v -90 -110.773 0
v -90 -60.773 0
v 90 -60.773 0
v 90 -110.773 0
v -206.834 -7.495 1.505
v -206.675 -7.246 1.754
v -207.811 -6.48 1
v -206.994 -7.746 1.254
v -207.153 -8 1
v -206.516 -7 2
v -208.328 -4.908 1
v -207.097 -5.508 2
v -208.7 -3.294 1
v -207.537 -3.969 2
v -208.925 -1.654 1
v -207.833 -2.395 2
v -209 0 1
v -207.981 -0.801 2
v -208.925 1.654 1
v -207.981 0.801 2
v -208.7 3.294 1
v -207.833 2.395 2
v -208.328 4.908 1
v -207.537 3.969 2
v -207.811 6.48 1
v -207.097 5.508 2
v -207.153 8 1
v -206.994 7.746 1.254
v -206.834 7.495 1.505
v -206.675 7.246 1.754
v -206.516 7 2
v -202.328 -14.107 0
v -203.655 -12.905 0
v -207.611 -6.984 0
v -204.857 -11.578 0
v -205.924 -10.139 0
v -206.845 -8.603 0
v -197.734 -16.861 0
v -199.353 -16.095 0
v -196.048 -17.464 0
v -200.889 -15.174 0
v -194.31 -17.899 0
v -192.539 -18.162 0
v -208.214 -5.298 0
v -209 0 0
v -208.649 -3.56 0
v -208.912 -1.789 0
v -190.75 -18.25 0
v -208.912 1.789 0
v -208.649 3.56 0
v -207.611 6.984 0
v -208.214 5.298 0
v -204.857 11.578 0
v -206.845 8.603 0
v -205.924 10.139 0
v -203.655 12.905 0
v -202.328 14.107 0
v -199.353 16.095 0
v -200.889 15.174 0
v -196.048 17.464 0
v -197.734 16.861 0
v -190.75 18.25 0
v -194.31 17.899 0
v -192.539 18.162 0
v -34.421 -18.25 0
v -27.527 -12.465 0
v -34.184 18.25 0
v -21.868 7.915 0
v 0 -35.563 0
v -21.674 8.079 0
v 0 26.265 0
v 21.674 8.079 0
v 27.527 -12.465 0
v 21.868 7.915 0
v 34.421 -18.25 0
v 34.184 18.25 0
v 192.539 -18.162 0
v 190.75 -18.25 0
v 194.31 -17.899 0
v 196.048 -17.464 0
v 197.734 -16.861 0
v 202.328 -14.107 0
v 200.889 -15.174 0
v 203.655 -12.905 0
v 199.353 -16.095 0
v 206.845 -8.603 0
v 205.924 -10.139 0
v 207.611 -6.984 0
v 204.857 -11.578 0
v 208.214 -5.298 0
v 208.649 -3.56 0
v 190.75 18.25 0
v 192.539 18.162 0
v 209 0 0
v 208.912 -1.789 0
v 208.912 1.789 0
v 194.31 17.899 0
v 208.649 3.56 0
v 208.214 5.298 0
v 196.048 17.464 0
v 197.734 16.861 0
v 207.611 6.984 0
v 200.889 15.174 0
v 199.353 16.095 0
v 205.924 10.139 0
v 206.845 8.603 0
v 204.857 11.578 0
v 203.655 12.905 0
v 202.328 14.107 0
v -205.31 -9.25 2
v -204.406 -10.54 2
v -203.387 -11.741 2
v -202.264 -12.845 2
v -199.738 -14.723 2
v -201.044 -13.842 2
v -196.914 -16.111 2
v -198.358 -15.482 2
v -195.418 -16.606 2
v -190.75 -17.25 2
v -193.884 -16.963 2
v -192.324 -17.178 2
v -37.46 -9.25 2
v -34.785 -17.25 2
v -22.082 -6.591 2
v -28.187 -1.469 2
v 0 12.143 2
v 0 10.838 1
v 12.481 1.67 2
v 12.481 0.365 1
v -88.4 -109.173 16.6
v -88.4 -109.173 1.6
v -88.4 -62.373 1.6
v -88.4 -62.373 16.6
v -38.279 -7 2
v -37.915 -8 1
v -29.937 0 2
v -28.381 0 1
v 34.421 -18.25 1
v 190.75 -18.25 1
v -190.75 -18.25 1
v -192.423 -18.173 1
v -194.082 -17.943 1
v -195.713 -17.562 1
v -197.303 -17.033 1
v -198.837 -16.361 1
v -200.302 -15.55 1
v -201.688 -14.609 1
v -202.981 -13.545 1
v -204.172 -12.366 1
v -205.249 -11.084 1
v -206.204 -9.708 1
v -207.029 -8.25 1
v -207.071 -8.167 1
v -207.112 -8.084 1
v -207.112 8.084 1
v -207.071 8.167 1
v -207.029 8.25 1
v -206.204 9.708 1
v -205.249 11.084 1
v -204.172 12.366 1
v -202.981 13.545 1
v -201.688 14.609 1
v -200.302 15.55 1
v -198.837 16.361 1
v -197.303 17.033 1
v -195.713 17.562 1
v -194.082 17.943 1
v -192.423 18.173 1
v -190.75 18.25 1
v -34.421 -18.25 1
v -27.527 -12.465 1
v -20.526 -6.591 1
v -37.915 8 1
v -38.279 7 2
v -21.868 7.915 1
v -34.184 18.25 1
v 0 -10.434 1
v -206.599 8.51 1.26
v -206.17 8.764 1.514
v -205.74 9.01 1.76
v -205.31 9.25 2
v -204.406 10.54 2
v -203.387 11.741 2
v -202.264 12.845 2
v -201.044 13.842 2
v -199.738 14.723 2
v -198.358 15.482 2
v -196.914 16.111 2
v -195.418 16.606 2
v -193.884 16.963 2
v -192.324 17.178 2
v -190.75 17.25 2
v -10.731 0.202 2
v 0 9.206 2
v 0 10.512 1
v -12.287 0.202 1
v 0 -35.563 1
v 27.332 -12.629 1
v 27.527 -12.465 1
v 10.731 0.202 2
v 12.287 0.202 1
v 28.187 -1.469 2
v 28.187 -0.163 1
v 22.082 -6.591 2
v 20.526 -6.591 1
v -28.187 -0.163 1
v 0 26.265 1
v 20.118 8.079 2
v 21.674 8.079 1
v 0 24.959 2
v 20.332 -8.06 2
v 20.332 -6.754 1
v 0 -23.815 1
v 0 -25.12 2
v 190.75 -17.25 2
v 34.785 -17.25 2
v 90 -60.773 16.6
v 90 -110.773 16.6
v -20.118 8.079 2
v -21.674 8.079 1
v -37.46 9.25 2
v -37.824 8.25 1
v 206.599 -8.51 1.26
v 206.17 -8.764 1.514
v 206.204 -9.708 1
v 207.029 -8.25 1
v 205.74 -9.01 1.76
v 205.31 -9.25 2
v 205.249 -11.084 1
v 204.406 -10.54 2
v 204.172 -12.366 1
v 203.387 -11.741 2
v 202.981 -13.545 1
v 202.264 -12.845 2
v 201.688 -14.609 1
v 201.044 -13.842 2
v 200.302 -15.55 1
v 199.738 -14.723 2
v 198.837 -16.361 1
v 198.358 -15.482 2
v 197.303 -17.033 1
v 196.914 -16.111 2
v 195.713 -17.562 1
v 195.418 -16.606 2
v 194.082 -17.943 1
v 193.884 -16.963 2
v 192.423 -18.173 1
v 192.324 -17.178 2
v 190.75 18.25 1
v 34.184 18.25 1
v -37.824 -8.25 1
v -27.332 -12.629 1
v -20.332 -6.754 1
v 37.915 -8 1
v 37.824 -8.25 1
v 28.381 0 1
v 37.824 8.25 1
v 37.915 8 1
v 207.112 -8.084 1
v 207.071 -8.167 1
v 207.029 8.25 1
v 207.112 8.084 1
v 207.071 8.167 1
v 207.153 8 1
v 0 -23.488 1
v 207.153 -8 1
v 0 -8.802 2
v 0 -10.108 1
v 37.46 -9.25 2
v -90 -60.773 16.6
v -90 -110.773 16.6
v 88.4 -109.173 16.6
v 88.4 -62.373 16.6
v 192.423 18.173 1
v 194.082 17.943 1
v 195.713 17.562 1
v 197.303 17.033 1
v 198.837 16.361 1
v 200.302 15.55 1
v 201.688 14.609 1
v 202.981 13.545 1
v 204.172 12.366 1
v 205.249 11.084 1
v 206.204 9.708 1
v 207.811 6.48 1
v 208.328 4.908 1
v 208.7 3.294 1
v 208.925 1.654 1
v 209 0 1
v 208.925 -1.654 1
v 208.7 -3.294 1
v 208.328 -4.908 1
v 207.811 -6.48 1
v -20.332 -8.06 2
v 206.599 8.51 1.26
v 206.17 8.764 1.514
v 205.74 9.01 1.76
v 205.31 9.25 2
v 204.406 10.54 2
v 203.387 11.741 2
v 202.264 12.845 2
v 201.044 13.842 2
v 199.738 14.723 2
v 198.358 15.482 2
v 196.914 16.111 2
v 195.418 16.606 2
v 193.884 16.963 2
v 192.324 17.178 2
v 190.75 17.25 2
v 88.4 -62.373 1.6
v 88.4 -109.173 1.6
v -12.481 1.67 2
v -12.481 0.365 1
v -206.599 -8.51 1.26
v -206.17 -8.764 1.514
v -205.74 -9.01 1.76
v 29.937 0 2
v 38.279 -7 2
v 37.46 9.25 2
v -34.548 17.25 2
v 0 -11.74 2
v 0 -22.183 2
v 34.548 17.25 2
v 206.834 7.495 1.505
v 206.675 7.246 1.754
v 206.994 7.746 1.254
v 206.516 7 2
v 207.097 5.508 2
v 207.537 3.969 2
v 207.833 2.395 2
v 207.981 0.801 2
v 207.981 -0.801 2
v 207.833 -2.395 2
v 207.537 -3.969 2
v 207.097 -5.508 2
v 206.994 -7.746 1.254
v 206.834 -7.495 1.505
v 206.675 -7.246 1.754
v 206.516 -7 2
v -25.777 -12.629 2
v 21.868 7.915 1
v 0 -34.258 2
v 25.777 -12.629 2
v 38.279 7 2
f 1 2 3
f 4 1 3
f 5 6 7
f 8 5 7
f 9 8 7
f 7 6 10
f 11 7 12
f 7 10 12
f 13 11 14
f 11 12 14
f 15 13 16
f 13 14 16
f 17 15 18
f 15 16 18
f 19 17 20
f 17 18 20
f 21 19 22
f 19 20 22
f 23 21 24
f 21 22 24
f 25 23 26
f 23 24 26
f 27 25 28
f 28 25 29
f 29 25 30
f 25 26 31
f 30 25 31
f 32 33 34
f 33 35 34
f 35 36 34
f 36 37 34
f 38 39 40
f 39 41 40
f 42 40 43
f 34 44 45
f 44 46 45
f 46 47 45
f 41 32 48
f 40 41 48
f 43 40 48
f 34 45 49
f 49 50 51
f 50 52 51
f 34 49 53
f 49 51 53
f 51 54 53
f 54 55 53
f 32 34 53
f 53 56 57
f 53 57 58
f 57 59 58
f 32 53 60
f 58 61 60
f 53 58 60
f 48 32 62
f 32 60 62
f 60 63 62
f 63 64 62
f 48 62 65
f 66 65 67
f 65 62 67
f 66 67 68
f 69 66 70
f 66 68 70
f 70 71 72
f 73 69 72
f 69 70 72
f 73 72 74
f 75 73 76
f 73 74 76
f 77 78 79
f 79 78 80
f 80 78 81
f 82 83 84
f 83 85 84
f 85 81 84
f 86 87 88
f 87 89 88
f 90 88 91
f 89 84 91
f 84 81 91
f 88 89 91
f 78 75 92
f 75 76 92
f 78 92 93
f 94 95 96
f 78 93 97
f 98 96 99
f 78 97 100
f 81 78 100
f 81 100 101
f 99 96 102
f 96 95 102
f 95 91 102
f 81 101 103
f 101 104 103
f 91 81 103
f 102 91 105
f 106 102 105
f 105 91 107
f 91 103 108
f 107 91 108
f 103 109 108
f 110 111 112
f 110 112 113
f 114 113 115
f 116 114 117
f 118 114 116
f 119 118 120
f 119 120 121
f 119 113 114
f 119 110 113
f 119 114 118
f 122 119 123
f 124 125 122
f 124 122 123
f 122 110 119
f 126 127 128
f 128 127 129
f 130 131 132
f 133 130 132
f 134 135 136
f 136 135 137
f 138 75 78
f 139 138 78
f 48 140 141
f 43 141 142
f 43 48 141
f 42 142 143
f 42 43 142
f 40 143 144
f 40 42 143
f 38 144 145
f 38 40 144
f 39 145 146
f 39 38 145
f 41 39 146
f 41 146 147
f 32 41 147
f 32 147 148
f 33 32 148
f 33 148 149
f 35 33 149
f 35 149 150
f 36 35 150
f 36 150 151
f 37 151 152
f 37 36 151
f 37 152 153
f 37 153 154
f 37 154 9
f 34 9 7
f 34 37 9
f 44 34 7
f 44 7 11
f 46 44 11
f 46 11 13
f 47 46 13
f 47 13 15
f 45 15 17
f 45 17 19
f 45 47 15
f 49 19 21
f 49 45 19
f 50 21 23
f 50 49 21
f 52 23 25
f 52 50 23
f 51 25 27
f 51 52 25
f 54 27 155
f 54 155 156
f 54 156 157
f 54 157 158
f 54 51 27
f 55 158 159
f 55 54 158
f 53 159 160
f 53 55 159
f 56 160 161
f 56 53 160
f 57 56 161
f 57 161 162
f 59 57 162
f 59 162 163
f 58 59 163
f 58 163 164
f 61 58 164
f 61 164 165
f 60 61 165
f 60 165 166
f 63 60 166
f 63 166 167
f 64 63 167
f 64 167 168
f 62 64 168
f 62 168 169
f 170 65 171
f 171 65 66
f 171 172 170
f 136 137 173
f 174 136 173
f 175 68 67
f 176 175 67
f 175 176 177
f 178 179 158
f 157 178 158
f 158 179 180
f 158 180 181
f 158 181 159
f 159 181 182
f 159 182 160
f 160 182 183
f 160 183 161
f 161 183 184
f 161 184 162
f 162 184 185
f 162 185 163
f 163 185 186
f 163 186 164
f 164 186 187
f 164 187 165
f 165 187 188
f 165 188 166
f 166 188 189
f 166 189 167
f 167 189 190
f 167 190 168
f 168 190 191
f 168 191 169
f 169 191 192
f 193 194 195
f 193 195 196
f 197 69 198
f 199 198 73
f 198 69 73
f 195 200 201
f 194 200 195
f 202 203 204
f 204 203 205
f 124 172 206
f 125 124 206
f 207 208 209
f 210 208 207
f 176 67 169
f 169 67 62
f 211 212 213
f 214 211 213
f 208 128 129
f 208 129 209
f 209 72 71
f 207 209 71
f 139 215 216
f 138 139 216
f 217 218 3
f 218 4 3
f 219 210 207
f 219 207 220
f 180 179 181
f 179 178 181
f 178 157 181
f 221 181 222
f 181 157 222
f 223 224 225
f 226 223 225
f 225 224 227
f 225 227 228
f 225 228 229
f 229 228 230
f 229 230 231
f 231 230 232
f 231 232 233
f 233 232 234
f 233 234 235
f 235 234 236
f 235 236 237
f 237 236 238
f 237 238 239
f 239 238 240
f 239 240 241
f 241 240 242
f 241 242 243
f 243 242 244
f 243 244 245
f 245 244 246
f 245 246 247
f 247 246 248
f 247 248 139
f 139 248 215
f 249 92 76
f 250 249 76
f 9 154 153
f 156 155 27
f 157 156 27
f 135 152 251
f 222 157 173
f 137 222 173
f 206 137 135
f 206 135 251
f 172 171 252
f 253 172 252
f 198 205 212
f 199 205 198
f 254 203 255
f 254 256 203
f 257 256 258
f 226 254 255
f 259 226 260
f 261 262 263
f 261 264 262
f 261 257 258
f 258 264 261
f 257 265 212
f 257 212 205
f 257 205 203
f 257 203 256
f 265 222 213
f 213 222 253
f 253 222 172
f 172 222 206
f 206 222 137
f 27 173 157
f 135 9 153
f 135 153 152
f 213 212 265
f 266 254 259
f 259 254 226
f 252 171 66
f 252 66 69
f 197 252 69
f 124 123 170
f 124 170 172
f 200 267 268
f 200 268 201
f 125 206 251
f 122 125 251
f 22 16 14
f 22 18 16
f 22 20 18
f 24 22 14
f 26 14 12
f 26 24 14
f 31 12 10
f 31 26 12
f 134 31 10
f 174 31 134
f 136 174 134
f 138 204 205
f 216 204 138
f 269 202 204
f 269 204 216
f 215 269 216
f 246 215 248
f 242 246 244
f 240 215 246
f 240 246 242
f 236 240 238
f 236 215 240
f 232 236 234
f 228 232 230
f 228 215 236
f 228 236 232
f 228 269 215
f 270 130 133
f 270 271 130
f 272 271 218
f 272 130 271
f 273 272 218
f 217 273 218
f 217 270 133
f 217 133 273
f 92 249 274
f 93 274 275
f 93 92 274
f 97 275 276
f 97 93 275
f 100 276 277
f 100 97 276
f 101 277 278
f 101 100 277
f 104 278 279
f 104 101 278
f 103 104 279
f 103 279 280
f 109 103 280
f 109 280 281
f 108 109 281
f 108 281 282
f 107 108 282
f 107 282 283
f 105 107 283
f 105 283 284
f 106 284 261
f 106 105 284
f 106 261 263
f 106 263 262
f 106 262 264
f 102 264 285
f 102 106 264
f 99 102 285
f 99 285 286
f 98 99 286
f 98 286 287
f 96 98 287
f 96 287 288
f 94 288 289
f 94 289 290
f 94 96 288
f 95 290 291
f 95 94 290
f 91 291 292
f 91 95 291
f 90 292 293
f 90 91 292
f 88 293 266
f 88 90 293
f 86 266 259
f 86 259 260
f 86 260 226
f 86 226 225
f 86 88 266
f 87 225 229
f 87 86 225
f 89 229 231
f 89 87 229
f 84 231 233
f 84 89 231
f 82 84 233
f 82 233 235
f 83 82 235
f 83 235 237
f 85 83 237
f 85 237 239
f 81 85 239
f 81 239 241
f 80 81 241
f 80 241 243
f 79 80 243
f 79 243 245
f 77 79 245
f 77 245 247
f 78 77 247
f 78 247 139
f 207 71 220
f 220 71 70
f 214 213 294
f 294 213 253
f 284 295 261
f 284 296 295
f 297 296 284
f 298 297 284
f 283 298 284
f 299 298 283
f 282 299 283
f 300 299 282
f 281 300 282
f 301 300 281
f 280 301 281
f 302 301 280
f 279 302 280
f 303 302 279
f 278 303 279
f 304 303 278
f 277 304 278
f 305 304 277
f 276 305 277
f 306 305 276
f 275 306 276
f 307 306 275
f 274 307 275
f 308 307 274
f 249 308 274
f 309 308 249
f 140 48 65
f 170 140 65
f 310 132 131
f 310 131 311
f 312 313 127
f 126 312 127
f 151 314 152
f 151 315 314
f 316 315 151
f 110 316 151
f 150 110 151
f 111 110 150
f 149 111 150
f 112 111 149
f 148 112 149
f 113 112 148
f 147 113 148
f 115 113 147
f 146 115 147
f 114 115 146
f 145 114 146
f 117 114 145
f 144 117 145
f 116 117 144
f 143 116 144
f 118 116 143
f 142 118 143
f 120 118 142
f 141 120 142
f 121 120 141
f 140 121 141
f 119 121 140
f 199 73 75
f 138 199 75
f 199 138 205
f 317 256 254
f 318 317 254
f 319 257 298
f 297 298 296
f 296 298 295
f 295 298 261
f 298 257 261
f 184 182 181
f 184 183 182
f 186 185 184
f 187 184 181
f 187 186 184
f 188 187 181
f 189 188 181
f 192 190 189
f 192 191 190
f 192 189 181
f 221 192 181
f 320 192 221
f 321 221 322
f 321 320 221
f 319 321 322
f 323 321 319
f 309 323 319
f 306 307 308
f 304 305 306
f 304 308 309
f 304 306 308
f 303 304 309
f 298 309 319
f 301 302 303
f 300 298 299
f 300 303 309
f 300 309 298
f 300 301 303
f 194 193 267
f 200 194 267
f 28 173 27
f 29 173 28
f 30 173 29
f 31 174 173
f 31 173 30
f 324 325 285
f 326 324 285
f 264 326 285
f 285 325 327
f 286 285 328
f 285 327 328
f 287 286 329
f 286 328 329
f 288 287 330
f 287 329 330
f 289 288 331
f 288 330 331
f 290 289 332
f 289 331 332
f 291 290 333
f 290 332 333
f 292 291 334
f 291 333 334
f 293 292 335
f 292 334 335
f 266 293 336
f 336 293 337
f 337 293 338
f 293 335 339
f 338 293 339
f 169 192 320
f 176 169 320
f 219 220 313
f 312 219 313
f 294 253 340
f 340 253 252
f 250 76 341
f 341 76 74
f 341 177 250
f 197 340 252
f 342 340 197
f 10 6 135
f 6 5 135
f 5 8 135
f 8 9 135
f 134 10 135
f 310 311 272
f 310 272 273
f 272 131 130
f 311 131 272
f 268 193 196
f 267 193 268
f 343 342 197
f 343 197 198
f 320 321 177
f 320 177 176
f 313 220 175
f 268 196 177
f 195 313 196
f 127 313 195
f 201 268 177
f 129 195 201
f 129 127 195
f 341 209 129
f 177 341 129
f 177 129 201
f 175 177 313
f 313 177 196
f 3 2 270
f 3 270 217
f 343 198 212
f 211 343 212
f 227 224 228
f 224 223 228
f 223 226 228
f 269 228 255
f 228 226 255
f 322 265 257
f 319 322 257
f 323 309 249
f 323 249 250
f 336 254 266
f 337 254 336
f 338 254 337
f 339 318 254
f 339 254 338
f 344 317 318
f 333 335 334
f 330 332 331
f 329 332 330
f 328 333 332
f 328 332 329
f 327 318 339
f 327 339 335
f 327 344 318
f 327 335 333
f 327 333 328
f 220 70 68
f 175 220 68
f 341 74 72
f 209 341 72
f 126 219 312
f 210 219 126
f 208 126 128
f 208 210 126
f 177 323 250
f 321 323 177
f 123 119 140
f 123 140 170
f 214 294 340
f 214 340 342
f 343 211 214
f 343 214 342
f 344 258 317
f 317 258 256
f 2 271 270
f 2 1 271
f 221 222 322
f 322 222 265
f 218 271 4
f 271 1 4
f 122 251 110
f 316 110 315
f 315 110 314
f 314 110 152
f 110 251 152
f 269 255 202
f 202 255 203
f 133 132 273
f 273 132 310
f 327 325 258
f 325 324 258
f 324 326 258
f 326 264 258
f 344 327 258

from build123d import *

# Parameters (mm, degrees)
F1_DEPTH  = 2
F3_DEPTH  = 2
F5_DEPTH  = 2
F7_DEPTH  = 2
F9_DEPTH  = 1
F12_DEPTH = 2
F13_SIZE  = 0.99999
F14_W     = 180
F14_H     = 50
F15_DEPTH = 1.6
F16_W     = 180
F16_H     = 50
F16_W_2   = 176.8
F16_H_2   = 46.8
F17_DEPTH = 15


# Not quite as in the source:
# - a fillet or chamfer is up to 0.001 mm smaller than in the source, because OpenCascade refuses the exact size


with BuildPart() as f1:
    # F0 (on Top) → F1 (new body)
    with BuildSketch(Plane.XY):
        Polygon((37.9150851114, 8), (28.3810563706, 0), (37.9150851114, -8), (210, -8), (210, 0), (210, 8), align=None)
    extrude(amount=F1_DEPTH)


with BuildPart() as f1b:
    # F0 (on Top) → F1, piece 2 (new body)
    with BuildSketch(Plane.XY):
        Polygon((-37.9150851114, -8), (-28.3810563706, 0), (-37.9150851114, 8), (-210, 8), (-210, 0), (-210, -8), align=None)
    extrude(amount=F1_DEPTH)


with BuildPart() as f3:
    # F2 (on Top) → F3 (new body)
    with BuildSketch(Plane.XY):
        Polygon((-37.8240925528, 8.25), (0, -23.4881821107), (37.8240925528, 8.25), (210, 8.25), (210, 18.25), (34.1843902102, 18.25), (0, -10.4341092174), (-34.1843902102, 18.25), (-210, 18.25), (-210, 8.25), align=None)
    extrude(amount=F3_DEPTH)


with BuildPart() as f5:
    # F4 (on Top) → F5 (new body)
    with BuildSketch(Plane.XY):
        Polygon((12.4810478052, 0.365085215), (21.6735811226, 8.0785365312), (0, 26.2648304575), (-21.6735811226, 8.0785365312), (-12.4810478052, 0.365085215), (0, 10.8379278251), align=None)
    extrude(amount=F5_DEPTH)


with BuildPart() as f5b:
    # F4 (on Top) → F5, piece 2 (new body)
    with BuildSketch(Plane.XY):
        Polygon((37.8240925528, -8.25), (28.1865908923, -0.1631759112), (20.5261464611, -6.591052008), (34.4207396164, -18.25), (210, -18.25), (210, -8.25), align=None)
    extrude(amount=F5_DEPTH)


with BuildPart() as f5c:
    # F4 (on Top) → F5, piece 3 (new body)
    with BuildSketch(Plane.XY):
        Polygon((-210, -18.25), (-34.4207396164, -18.25), (-20.5261464611, -6.591052008), (-28.1865908923, -0.1631759112), (-37.8240925528, -8.25), (-210, -8.25), align=None)
    extrude(amount=F5_DEPTH)


with BuildPart() as f7:
    # F6 (on Top) → F7 (new body)
    with BuildSketch(Plane.XY):
        Polygon((-27.3324382036, -12.6285607212), (0, -35.563199537), (27.3324382036, -12.6285607212), (20.3316809827, -6.7542279192), (0, -23.814533933), (-20.3316809827, -6.7542279192), align=None)
    extrude(amount=F7_DEPTH)


with BuildPart() as f7b:
    # F6 (on Top) → F7, piece 2 (new body)
    with BuildSketch(Plane.XY):
        Polygon((-12.2865823268, 0.2019093038), (0, -10.107757395), (12.2865823268, 0.2019093038), (0, 10.5115760027), align=None)
    extrude(amount=F7_DEPTH)


with BuildPart() as f9:
    # F8 (on Top) → F9 (new body)
    with BuildSketch(Plane.XY):
        Polygon((21.868046601, 7.9153606201), (0, 26.2648304575), (-21.868046601, 7.9153606201), (-34.1843902102, 18.25), (-210, 18.25), (-210, -18.25), (-34.4207396164, -18.25), (-27.526903682, -12.46538481), (0, -35.563199537), (27.526903682, -12.46538481), (34.4207396164, -18.25), (210, -18.25), (210, 18.25), (34.1843902102, 18.25), align=None)
    extrude(amount=F9_DEPTH)


with BuildPart() as f1_1:
    add(f1.part)

    # F10: union F1b, F3, F5, F5b, F5c, F7, F7b, F9
    add(f1b.part)
    add(f3.part)
    add(f5.part)
    add(f5b.part)
    add(f5c.part)
    add(f7.part)
    add(f7b.part)
    add(f9.part)

    # F11 (on Top) → F12 (cut, through all)
    with BuildSketch(Plane.XY):
        with BuildLine():
            ThreePointArc((190.75, 18.25), (209, 0), (190.75, -18.25))
            Line((190.75, -18.25), (224.6172776222, -18.25))
            Line((224.6172776222, -18.25), (224.6172776222, 18.25))
            Line((224.6172776222, 18.25), (190.75, 18.25))
        make_face()
        with BuildLine():
            Line((-224.6172776222, -18.25), (-190.75, -18.25))
            ThreePointArc((-190.75, -18.25), (-209, 0), (-190.75, 18.25))
            Line((-190.75, 18.25), (-224.6172776222, 18.25))
            Line((-224.6172776222, 18.25), (-224.6172776222, -18.25))
        make_face()
    extrude(amount=F12_DEPTH, mode=Mode.SUBTRACT)

    # F13 (size 1 in the source; OpenCascade refuses exactly that, so slightly less here)
    f13_edges = [f1_1.edges().sort_by_distance(p)[0] for p in [
        (-122.426457, 8.25, 2),
        (-200.302487, 15.550322, 2),
        (-112.467195, 18.25, 2),
        (-17.092195, 3.907945, 2),
        (17.092195, 3.907945, 2),
        (112.467195, 18.25, 2),
        (200.302487, 15.550322, 2),
        (122.426457, 8.25, 2),
        (18.912046, -7.619091, 2),
        (-18.912046, -7.619091, 2),
        (-122.534105, -8, 2),
        (-209, 0, 2),
        (-122.534105, 8, 2),
        (-33.148071, 4, 2),
        (-33.148071, -4, 2),
        (-33.005342, -4.206588, 2),
        (-24.356369, -3.377114, 2),
        (-27.473443, -12.420526, 2),
        (-112.58537, -18.25, 2),
        (-200.302487, -15.550322, 2),
        (-122.426457, -8.25, 2),
        (6.240524, 5.601507, 2),
        (17.077314, 4.221811, 2),
        (10.836791, 17.171683, 2),
        (-10.836791, 17.171683, 2),
        (-17.077314, 4.221811, 2),
        (-6.240524, 5.601507, 2),
        (-6.143291, -4.952924, 2),
        (6.143291, -4.952924, 2),
        (6.143291, 5.356743, 2),
        (-6.143291, 5.356743, 2),
        (-23.83206, -9.691394, 2),
        (-13.666219, -24.09588, 2),
        (13.666219, -24.09588, 2),
        (23.83206, -9.691394, 2),
        (10.16584, -15.284381, 2),
        (-10.16584, -15.284381, 2),
        (122.426457, -8.25, 2),
        (200.302487, -15.550322, 2),
        (112.58537, -18.25, 2),
        (27.473443, -12.420526, 2),
        (24.356369, -3.377114, 2),
        (33.005342, -4.206588, 2),
        (122.534105, 8, 2),
        (209, 0, 2),
        (122.534105, -8, 2),
        (33.148071, -4, 2),
        (33.148071, 4, 2),
    ]]
    chamfer(f13_edges, length=F13_SIZE)


with BuildPart() as f15:
    # F14 (on Top) → F15 (new body)
    with BuildSketch(Plane.XY):
        with Locations((0, -85.7728616616)):
            Rectangle(F14_W, F14_H)
    extrude(amount=F15_DEPTH)

    # F16 (on face) → F17 (join)
    with BuildSketch(Plane.XY.offset(1.6)):
        with Locations((0, -85.7728616616)):
            Rectangle(F16_W, F16_H)
        with Locations((0, -85.7728616616)):
            Rectangle(F16_W_2, F16_H_2, mode=Mode.SUBTRACT)
    extrude(amount=F17_DEPTH)


solid = Compound([f1_1.part, f15.part])
